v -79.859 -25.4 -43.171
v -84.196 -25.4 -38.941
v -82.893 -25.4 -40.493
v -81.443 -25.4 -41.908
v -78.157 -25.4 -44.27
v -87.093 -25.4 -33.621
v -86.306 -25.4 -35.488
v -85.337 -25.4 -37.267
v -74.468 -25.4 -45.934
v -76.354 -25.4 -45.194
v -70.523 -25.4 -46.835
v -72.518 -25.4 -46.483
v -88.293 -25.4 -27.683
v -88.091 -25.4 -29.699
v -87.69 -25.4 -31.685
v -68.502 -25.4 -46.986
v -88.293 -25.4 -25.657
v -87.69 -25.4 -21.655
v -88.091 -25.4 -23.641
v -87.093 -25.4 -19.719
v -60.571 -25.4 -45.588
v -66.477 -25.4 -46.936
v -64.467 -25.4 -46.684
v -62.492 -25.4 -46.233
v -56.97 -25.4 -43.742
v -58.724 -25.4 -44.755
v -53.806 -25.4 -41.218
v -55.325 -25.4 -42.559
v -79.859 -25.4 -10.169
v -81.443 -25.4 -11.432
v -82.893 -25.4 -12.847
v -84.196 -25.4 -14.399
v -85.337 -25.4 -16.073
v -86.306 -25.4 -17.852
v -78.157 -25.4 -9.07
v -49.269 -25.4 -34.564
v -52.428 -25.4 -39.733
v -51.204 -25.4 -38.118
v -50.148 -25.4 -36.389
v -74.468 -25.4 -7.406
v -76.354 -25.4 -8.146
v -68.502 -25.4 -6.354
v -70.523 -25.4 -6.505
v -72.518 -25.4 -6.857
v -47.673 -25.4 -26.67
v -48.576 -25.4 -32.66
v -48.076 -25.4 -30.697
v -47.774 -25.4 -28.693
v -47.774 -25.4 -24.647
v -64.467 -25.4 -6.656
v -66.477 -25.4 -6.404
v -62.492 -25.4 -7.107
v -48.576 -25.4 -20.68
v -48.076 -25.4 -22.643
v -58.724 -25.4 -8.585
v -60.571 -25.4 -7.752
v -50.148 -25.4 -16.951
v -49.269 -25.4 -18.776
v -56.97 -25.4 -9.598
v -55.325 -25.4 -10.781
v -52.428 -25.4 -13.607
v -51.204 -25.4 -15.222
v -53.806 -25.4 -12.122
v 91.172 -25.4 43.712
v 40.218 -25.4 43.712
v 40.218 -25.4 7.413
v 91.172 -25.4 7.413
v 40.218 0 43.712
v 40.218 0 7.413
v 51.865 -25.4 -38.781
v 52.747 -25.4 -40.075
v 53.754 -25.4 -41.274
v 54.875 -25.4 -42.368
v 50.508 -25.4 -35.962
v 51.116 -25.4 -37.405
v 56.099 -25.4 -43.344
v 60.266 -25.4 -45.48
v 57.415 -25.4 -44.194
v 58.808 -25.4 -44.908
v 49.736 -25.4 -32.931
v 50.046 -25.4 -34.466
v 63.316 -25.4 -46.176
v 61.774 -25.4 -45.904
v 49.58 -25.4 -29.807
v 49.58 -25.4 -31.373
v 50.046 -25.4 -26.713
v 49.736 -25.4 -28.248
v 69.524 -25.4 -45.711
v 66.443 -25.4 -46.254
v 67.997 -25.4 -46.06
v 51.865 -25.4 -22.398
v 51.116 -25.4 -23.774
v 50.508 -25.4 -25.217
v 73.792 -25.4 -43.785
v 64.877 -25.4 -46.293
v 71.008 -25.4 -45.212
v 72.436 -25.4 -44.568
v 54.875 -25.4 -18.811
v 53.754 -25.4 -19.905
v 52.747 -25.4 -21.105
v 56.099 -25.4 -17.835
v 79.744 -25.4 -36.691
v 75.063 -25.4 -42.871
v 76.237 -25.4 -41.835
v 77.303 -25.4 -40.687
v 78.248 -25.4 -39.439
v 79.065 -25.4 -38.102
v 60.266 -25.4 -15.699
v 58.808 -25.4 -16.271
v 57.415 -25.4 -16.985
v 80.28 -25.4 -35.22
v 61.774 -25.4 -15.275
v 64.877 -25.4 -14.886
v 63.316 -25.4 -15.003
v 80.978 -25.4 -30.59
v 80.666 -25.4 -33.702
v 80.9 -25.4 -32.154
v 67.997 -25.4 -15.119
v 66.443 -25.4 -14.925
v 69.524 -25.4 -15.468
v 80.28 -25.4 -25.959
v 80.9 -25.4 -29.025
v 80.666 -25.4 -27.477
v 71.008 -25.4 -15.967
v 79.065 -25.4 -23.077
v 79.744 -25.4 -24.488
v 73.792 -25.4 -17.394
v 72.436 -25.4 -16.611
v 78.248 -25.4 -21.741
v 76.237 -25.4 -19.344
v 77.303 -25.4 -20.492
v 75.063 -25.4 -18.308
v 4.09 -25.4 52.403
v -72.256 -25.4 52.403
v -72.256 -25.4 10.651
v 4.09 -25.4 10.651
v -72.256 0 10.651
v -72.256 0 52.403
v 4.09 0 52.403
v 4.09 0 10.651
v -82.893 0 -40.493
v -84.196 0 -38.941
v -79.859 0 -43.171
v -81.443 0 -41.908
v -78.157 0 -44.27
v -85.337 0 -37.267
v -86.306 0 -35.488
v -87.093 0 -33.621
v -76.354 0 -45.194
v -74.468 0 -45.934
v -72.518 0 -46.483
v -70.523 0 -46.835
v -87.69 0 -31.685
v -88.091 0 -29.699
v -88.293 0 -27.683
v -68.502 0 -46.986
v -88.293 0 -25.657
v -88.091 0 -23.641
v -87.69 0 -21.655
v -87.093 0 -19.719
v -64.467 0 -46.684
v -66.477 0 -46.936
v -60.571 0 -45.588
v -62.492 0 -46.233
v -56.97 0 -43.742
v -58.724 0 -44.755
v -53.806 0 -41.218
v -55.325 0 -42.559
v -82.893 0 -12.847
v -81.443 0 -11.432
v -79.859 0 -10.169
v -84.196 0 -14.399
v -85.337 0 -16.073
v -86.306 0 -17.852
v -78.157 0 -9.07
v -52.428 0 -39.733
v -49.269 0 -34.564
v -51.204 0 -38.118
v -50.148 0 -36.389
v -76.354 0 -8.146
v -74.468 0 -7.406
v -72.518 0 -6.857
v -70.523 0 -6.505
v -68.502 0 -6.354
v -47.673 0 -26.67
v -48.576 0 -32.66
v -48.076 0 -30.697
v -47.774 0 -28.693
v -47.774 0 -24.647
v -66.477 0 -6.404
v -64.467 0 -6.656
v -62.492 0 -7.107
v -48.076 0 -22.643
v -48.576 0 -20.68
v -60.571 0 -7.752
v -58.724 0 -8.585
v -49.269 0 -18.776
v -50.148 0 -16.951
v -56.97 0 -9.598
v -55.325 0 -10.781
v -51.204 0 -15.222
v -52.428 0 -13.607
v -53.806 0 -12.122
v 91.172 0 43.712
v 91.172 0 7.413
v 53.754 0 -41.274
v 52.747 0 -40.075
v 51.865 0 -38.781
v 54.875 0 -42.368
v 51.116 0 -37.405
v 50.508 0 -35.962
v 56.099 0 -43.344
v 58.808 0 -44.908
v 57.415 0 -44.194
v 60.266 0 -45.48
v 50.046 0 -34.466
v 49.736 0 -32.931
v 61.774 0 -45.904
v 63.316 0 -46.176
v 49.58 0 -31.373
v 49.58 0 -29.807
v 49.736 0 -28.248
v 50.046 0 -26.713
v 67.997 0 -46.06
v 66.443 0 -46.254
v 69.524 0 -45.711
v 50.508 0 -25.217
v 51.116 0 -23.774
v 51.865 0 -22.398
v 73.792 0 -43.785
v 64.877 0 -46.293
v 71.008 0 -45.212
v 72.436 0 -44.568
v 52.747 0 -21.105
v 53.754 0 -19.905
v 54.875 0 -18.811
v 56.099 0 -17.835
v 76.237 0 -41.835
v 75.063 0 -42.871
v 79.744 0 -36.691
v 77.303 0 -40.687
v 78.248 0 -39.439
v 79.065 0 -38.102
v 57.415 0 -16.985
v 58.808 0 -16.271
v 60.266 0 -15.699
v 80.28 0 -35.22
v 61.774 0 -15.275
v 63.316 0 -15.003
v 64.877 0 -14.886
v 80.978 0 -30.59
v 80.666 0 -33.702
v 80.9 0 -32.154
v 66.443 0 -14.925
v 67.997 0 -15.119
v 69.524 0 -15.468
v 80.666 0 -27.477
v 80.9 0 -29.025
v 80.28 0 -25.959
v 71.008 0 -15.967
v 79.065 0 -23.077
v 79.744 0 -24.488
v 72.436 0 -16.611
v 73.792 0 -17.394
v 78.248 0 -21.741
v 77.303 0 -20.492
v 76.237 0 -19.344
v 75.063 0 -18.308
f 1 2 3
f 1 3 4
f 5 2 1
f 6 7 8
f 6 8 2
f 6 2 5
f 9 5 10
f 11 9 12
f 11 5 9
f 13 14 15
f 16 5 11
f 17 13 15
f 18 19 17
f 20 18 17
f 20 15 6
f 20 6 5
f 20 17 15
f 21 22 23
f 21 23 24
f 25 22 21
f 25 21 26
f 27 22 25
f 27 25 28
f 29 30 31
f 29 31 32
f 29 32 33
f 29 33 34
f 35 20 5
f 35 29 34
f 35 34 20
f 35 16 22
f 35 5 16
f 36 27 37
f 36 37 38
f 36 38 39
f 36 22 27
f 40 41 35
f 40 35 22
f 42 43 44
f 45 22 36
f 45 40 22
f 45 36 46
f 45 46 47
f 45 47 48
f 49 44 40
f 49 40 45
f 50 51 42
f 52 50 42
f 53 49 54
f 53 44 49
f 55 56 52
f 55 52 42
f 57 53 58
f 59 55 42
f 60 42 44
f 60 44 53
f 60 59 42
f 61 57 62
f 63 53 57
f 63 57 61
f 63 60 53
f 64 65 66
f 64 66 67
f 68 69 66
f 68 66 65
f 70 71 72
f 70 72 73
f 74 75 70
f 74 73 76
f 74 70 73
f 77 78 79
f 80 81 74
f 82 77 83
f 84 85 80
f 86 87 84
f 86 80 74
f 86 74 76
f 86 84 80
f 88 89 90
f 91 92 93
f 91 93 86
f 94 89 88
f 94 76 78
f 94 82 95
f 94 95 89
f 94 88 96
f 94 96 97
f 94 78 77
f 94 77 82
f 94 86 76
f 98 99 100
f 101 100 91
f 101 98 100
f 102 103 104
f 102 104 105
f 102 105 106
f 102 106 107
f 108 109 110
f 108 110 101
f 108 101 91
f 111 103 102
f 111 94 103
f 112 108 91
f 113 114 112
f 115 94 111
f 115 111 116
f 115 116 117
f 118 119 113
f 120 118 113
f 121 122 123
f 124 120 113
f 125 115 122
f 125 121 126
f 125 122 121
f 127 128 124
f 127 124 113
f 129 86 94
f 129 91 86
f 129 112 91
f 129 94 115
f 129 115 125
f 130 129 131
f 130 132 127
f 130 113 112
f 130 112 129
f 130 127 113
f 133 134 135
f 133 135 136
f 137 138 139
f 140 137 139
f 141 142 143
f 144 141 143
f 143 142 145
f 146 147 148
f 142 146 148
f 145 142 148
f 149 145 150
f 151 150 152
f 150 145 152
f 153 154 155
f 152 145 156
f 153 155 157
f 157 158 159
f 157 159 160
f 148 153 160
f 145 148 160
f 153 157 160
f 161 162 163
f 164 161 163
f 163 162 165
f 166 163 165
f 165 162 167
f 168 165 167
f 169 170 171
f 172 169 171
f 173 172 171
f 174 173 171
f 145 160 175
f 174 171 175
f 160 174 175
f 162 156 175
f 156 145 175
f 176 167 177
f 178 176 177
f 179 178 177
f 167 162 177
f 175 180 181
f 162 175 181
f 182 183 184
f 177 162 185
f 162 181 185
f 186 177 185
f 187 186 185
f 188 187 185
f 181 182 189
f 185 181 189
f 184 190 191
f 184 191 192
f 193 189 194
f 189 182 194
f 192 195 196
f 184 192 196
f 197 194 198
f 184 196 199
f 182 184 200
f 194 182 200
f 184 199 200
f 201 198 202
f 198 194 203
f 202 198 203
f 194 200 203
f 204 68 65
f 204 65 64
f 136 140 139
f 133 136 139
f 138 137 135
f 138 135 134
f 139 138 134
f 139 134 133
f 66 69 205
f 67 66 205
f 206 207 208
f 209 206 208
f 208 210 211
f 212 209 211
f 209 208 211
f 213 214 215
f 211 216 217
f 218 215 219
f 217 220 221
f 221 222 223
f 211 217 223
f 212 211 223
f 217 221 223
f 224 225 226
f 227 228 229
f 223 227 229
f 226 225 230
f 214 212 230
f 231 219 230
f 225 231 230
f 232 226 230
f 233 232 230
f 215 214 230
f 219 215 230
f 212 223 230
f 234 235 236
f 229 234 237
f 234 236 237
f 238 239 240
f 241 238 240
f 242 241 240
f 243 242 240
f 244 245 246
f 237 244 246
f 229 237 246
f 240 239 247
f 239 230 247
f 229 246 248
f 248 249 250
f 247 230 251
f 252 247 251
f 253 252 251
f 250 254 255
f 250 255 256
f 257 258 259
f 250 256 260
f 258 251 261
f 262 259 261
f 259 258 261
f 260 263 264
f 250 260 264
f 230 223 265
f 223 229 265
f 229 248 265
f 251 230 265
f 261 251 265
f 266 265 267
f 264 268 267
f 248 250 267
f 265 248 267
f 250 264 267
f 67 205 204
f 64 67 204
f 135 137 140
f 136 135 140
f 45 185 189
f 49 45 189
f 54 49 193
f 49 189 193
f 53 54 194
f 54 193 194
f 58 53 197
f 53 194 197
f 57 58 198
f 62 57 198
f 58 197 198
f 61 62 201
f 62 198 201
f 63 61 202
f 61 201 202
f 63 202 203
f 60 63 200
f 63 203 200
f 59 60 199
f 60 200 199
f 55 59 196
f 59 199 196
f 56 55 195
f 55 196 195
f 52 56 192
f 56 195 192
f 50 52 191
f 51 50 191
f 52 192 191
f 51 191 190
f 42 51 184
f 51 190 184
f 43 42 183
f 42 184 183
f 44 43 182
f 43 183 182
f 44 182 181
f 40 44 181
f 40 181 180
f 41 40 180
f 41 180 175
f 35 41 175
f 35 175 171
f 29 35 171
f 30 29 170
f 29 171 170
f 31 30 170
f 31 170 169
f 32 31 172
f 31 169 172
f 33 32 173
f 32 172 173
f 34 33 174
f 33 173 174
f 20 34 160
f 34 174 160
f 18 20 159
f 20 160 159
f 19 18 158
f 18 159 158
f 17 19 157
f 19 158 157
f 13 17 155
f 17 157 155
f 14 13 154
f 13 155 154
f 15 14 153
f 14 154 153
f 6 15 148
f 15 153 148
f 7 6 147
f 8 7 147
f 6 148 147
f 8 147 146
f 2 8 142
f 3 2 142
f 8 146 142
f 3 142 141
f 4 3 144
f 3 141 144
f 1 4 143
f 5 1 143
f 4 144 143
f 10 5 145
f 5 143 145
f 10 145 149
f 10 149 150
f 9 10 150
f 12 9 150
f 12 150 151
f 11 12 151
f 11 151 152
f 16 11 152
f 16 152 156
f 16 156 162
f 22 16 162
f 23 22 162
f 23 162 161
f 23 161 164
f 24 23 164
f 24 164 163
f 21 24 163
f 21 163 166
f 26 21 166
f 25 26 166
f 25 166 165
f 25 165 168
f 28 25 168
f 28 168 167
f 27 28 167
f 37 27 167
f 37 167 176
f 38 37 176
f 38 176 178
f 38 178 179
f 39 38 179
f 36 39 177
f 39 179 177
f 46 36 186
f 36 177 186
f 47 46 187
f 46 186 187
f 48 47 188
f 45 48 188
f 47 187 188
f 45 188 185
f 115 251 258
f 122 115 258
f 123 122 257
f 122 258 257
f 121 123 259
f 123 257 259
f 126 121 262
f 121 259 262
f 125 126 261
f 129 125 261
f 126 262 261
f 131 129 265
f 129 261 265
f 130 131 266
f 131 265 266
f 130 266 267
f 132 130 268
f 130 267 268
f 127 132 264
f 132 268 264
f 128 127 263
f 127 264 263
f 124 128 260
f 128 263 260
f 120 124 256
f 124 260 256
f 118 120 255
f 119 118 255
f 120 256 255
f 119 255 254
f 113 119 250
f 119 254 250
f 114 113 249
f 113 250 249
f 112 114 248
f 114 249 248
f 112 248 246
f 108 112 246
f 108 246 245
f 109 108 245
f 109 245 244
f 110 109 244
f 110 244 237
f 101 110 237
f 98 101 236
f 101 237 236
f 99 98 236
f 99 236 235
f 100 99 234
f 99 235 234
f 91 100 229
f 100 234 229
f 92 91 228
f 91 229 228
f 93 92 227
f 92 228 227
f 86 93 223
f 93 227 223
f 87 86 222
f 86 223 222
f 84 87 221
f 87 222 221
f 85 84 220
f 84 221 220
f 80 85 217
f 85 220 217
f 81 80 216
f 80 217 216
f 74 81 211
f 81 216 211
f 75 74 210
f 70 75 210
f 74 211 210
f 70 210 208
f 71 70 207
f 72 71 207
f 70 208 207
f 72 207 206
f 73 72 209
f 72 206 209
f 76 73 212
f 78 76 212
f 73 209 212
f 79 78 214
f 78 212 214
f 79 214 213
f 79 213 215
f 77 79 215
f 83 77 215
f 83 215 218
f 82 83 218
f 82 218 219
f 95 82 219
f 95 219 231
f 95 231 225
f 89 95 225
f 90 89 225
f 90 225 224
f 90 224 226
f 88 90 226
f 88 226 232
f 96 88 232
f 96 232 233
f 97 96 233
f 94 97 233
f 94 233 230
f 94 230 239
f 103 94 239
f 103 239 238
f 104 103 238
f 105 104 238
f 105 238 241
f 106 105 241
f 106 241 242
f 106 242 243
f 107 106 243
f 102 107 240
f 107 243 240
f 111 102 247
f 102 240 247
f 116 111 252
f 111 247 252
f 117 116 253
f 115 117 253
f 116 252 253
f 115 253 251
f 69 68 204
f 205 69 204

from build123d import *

# Parameters (mm, degrees)
F0_W     = 76.34607
F0_H     = 41.751753
F0_W_2   = 50.954181
F0_H_2   = 36.298465
F0_R     = 20.322737
F0_R_2   = 15.70874
F1_DEPTH = 25.4


with BuildPart() as f1:
    # F0 (on Front) → F1 (new body)
    with BuildSketch(Plane.XZ):
        with Locations((-34.083068, 31.526836)):
            Rectangle(F0_W, F0_H)
        with Locations((65.695112, 25.562299)):
            Rectangle(F0_W_2, F0_H_2)
        with Locations((-67.99572, -26.670001)):
            Circle(F0_R)
        with Locations((65.269075, -30.589554)):
            Circle(F0_R_2)
    extrude(amount=F1_DEPTH)


solid = f1.part
